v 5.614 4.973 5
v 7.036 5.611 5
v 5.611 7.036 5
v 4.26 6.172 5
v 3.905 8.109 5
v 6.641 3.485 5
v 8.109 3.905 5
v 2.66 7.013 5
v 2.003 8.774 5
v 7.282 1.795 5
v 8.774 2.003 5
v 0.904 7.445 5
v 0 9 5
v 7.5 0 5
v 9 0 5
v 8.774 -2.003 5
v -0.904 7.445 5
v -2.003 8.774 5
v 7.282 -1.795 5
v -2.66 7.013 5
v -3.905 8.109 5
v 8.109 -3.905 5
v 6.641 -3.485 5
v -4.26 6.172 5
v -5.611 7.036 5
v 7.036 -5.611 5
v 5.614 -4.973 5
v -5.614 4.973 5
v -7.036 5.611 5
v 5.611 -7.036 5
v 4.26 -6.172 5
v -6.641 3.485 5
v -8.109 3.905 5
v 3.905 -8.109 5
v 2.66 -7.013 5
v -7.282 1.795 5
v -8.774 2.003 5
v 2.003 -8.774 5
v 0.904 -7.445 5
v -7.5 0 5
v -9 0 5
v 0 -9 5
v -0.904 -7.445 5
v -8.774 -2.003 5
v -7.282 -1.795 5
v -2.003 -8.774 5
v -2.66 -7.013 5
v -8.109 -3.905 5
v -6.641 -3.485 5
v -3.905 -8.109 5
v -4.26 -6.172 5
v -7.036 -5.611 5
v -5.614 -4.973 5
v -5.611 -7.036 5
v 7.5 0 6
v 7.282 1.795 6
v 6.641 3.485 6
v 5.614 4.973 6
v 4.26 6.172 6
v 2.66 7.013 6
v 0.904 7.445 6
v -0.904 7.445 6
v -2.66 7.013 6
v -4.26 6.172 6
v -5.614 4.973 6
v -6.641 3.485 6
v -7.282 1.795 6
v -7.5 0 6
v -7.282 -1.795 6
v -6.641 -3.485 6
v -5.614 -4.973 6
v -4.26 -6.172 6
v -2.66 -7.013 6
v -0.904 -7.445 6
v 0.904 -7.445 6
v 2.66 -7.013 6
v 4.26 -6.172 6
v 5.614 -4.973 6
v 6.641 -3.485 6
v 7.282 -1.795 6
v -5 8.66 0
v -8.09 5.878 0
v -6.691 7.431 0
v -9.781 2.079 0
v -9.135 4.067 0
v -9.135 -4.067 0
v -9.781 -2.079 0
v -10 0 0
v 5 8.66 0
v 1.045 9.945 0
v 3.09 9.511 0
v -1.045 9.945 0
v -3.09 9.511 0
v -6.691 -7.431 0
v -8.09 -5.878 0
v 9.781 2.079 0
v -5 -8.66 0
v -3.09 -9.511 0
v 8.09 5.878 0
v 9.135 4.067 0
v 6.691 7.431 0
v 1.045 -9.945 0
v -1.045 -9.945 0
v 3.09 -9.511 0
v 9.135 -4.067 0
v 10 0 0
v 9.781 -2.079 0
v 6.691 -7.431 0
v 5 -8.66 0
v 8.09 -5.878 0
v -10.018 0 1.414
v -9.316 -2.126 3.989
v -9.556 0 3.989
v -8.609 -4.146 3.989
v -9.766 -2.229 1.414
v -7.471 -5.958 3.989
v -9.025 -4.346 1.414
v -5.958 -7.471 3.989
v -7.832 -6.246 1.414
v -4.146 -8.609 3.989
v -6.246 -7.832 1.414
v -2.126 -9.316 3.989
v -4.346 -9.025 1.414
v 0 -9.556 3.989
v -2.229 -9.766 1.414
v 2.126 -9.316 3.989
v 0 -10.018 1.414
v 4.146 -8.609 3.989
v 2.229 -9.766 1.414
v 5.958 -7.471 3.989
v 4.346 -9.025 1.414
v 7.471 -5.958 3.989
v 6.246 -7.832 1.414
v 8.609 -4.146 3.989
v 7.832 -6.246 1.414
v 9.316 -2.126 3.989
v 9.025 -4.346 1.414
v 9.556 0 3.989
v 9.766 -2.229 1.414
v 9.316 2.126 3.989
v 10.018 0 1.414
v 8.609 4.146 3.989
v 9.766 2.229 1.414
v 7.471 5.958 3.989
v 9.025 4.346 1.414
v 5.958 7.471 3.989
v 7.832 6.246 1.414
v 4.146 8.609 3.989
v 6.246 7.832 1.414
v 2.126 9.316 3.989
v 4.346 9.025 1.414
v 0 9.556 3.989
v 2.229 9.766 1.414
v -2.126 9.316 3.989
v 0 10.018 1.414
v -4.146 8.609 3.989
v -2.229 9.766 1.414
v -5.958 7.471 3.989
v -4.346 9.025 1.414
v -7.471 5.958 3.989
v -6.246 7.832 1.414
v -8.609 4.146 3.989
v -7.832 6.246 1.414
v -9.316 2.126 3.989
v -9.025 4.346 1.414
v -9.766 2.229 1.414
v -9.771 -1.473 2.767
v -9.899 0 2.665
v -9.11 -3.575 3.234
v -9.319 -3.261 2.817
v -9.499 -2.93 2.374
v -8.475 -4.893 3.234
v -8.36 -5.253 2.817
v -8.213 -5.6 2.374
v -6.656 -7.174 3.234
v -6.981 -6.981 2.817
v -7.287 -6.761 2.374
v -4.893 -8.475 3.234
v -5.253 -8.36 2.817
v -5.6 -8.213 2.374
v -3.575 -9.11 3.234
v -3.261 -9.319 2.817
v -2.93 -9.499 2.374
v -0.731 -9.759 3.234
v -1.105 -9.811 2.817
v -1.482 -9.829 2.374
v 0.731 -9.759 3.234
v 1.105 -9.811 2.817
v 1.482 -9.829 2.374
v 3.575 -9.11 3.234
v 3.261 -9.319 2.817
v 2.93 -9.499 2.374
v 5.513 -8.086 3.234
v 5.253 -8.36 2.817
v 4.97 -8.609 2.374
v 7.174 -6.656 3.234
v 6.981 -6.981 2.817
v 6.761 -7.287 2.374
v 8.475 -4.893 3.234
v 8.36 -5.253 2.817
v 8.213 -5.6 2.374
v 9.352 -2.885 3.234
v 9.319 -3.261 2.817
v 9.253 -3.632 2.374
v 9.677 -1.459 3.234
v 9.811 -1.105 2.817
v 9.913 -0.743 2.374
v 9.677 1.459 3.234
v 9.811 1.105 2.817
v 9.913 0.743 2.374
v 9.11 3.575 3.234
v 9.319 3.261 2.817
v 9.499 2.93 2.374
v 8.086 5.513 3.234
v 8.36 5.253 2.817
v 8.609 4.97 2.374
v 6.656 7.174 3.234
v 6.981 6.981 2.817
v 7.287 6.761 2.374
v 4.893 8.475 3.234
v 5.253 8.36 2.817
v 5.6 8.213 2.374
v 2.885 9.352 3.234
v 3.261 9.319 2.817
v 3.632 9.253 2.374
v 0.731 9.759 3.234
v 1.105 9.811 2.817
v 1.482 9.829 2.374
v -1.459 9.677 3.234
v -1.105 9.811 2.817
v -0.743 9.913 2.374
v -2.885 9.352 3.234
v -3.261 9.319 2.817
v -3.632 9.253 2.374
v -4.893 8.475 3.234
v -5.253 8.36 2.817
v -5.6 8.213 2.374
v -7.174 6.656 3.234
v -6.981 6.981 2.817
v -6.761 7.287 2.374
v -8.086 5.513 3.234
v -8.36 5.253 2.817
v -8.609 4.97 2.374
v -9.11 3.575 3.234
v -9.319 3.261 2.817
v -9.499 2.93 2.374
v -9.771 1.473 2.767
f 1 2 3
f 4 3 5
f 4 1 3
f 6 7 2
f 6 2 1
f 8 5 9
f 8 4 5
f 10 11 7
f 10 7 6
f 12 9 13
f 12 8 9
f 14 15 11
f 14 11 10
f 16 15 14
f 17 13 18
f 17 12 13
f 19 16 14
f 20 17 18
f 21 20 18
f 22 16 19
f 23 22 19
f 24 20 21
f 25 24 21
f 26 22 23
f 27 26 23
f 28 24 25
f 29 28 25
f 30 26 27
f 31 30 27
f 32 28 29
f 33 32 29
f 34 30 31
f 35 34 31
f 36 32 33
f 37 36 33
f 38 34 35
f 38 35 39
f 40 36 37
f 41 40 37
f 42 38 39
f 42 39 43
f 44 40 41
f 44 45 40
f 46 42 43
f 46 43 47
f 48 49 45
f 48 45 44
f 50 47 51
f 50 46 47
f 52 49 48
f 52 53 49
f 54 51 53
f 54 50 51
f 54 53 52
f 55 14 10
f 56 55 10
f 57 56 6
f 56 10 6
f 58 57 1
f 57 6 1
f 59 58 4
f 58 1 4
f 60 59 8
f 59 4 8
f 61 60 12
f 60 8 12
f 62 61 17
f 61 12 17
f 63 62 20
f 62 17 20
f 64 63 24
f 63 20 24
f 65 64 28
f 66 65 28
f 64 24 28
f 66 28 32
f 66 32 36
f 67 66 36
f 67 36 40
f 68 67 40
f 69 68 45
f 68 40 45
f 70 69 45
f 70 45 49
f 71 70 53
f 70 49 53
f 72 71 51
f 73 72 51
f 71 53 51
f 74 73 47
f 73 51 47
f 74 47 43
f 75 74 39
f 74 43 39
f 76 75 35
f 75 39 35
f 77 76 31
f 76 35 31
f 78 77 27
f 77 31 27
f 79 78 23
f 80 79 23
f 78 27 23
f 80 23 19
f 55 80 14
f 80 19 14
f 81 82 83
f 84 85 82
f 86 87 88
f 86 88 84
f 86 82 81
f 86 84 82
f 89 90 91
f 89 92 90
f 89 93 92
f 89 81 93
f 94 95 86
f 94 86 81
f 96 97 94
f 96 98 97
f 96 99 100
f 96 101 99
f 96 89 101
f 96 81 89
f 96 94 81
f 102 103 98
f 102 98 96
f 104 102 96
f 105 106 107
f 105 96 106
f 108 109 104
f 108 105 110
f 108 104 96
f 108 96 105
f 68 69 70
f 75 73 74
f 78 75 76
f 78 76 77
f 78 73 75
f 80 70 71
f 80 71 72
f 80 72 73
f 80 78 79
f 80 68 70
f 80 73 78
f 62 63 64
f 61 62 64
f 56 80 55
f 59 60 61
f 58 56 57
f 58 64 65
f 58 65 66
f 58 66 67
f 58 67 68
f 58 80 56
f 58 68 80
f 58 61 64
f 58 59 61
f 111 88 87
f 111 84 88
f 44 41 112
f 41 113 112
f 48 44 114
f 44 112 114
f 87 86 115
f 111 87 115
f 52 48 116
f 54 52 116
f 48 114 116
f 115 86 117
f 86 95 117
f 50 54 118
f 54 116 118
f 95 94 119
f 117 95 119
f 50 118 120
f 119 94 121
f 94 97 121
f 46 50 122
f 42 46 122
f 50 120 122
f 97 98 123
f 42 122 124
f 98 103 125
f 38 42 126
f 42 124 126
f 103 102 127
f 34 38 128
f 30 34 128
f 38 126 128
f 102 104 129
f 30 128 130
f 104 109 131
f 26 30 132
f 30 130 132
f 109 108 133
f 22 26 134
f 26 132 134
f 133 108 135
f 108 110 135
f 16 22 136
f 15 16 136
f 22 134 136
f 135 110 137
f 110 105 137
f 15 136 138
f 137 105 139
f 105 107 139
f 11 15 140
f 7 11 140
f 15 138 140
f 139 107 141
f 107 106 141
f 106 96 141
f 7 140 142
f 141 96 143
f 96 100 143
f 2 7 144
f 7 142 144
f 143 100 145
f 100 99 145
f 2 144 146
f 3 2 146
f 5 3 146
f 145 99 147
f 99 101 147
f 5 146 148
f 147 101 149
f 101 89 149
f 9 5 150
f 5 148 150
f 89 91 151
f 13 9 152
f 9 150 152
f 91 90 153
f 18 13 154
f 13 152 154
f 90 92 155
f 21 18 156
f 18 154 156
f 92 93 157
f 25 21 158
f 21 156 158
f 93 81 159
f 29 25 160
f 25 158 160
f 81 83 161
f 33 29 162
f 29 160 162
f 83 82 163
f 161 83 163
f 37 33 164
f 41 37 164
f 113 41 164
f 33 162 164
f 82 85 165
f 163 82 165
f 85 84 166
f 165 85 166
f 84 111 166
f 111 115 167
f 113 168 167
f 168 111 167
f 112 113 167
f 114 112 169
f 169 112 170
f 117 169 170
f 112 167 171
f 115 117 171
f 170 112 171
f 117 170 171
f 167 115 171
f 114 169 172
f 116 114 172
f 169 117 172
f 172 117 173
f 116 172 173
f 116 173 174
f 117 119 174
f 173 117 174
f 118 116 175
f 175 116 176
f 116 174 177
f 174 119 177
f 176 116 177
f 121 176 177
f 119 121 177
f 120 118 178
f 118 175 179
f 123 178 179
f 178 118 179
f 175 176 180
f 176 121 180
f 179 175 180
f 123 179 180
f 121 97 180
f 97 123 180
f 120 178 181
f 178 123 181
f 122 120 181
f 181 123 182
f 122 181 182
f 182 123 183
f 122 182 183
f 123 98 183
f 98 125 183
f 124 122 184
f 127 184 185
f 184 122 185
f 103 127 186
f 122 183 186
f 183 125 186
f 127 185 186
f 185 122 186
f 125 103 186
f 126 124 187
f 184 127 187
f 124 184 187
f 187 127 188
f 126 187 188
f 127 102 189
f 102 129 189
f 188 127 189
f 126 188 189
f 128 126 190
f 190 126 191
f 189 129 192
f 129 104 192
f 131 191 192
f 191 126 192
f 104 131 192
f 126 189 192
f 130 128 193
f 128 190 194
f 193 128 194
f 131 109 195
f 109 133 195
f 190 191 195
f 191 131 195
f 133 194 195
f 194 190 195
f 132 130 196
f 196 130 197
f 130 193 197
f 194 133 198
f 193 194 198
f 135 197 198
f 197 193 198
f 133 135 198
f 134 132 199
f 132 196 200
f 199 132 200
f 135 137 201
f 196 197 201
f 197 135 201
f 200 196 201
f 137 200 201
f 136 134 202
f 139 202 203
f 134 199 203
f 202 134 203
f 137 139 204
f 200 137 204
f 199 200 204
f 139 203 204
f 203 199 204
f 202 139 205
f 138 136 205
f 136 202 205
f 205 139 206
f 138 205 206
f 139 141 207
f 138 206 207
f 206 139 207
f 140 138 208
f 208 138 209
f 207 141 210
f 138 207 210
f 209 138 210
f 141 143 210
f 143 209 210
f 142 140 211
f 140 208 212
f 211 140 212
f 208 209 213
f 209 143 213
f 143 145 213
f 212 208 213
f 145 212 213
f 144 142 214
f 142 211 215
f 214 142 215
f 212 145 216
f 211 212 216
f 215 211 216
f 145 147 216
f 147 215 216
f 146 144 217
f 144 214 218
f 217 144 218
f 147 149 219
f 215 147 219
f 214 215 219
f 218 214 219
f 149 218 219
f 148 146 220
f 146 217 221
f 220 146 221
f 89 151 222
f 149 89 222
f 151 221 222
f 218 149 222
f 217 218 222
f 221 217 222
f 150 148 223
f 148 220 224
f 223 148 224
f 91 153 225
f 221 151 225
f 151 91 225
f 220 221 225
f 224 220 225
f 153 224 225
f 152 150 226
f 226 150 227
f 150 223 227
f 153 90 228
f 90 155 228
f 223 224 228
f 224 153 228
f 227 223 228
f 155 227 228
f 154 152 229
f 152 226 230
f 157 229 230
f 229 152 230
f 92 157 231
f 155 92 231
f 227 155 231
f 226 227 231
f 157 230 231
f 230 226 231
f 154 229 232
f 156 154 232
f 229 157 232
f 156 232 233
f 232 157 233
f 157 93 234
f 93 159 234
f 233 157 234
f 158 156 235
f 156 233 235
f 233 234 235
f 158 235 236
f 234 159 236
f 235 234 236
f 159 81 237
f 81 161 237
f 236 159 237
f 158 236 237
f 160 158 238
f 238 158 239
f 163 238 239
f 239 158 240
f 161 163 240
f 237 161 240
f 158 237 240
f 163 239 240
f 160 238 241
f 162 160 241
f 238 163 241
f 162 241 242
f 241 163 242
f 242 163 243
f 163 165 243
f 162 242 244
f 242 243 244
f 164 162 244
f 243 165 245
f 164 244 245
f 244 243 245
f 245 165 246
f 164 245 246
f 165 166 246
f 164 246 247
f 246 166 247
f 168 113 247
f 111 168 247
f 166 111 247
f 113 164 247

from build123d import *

# Parameters (mm, degrees)
SKETCH_R      = 7.5
EXTRUDE_DEPTH = 1


with BuildPart() as extrude_body:
    # Sketch → Extrude (new body)
    with BuildSketch(Plane.XY.offset(5)):
        Circle(SKETCH_R)
    extrude(amount=EXTRUDE_DEPTH)


with BuildPart() as fusion:
    # Sketch001 → Revolve (revolve)
    with BuildSketch(Plane.XZ):
        with BuildLine():
            Line((0, 0), (-10, 0))
            add(Edge.make_bspline(
                [(-9, 5), (-9.79, 3.99), (-10.13, 2.25), (-10, 0)],
                knots=[0, 0, 0, 0, 1, 1, 1, 1], degree=3))
            Line((-9, 5), (0, 5))
            Line((0, 5), (0, 0))
        make_face()
    revolve(axis=Axis((0, 0, 0), (0, 0, 1)))

    # Fusion: union Extrude body
    add(extrude_body.part)


solid = fusion.part
